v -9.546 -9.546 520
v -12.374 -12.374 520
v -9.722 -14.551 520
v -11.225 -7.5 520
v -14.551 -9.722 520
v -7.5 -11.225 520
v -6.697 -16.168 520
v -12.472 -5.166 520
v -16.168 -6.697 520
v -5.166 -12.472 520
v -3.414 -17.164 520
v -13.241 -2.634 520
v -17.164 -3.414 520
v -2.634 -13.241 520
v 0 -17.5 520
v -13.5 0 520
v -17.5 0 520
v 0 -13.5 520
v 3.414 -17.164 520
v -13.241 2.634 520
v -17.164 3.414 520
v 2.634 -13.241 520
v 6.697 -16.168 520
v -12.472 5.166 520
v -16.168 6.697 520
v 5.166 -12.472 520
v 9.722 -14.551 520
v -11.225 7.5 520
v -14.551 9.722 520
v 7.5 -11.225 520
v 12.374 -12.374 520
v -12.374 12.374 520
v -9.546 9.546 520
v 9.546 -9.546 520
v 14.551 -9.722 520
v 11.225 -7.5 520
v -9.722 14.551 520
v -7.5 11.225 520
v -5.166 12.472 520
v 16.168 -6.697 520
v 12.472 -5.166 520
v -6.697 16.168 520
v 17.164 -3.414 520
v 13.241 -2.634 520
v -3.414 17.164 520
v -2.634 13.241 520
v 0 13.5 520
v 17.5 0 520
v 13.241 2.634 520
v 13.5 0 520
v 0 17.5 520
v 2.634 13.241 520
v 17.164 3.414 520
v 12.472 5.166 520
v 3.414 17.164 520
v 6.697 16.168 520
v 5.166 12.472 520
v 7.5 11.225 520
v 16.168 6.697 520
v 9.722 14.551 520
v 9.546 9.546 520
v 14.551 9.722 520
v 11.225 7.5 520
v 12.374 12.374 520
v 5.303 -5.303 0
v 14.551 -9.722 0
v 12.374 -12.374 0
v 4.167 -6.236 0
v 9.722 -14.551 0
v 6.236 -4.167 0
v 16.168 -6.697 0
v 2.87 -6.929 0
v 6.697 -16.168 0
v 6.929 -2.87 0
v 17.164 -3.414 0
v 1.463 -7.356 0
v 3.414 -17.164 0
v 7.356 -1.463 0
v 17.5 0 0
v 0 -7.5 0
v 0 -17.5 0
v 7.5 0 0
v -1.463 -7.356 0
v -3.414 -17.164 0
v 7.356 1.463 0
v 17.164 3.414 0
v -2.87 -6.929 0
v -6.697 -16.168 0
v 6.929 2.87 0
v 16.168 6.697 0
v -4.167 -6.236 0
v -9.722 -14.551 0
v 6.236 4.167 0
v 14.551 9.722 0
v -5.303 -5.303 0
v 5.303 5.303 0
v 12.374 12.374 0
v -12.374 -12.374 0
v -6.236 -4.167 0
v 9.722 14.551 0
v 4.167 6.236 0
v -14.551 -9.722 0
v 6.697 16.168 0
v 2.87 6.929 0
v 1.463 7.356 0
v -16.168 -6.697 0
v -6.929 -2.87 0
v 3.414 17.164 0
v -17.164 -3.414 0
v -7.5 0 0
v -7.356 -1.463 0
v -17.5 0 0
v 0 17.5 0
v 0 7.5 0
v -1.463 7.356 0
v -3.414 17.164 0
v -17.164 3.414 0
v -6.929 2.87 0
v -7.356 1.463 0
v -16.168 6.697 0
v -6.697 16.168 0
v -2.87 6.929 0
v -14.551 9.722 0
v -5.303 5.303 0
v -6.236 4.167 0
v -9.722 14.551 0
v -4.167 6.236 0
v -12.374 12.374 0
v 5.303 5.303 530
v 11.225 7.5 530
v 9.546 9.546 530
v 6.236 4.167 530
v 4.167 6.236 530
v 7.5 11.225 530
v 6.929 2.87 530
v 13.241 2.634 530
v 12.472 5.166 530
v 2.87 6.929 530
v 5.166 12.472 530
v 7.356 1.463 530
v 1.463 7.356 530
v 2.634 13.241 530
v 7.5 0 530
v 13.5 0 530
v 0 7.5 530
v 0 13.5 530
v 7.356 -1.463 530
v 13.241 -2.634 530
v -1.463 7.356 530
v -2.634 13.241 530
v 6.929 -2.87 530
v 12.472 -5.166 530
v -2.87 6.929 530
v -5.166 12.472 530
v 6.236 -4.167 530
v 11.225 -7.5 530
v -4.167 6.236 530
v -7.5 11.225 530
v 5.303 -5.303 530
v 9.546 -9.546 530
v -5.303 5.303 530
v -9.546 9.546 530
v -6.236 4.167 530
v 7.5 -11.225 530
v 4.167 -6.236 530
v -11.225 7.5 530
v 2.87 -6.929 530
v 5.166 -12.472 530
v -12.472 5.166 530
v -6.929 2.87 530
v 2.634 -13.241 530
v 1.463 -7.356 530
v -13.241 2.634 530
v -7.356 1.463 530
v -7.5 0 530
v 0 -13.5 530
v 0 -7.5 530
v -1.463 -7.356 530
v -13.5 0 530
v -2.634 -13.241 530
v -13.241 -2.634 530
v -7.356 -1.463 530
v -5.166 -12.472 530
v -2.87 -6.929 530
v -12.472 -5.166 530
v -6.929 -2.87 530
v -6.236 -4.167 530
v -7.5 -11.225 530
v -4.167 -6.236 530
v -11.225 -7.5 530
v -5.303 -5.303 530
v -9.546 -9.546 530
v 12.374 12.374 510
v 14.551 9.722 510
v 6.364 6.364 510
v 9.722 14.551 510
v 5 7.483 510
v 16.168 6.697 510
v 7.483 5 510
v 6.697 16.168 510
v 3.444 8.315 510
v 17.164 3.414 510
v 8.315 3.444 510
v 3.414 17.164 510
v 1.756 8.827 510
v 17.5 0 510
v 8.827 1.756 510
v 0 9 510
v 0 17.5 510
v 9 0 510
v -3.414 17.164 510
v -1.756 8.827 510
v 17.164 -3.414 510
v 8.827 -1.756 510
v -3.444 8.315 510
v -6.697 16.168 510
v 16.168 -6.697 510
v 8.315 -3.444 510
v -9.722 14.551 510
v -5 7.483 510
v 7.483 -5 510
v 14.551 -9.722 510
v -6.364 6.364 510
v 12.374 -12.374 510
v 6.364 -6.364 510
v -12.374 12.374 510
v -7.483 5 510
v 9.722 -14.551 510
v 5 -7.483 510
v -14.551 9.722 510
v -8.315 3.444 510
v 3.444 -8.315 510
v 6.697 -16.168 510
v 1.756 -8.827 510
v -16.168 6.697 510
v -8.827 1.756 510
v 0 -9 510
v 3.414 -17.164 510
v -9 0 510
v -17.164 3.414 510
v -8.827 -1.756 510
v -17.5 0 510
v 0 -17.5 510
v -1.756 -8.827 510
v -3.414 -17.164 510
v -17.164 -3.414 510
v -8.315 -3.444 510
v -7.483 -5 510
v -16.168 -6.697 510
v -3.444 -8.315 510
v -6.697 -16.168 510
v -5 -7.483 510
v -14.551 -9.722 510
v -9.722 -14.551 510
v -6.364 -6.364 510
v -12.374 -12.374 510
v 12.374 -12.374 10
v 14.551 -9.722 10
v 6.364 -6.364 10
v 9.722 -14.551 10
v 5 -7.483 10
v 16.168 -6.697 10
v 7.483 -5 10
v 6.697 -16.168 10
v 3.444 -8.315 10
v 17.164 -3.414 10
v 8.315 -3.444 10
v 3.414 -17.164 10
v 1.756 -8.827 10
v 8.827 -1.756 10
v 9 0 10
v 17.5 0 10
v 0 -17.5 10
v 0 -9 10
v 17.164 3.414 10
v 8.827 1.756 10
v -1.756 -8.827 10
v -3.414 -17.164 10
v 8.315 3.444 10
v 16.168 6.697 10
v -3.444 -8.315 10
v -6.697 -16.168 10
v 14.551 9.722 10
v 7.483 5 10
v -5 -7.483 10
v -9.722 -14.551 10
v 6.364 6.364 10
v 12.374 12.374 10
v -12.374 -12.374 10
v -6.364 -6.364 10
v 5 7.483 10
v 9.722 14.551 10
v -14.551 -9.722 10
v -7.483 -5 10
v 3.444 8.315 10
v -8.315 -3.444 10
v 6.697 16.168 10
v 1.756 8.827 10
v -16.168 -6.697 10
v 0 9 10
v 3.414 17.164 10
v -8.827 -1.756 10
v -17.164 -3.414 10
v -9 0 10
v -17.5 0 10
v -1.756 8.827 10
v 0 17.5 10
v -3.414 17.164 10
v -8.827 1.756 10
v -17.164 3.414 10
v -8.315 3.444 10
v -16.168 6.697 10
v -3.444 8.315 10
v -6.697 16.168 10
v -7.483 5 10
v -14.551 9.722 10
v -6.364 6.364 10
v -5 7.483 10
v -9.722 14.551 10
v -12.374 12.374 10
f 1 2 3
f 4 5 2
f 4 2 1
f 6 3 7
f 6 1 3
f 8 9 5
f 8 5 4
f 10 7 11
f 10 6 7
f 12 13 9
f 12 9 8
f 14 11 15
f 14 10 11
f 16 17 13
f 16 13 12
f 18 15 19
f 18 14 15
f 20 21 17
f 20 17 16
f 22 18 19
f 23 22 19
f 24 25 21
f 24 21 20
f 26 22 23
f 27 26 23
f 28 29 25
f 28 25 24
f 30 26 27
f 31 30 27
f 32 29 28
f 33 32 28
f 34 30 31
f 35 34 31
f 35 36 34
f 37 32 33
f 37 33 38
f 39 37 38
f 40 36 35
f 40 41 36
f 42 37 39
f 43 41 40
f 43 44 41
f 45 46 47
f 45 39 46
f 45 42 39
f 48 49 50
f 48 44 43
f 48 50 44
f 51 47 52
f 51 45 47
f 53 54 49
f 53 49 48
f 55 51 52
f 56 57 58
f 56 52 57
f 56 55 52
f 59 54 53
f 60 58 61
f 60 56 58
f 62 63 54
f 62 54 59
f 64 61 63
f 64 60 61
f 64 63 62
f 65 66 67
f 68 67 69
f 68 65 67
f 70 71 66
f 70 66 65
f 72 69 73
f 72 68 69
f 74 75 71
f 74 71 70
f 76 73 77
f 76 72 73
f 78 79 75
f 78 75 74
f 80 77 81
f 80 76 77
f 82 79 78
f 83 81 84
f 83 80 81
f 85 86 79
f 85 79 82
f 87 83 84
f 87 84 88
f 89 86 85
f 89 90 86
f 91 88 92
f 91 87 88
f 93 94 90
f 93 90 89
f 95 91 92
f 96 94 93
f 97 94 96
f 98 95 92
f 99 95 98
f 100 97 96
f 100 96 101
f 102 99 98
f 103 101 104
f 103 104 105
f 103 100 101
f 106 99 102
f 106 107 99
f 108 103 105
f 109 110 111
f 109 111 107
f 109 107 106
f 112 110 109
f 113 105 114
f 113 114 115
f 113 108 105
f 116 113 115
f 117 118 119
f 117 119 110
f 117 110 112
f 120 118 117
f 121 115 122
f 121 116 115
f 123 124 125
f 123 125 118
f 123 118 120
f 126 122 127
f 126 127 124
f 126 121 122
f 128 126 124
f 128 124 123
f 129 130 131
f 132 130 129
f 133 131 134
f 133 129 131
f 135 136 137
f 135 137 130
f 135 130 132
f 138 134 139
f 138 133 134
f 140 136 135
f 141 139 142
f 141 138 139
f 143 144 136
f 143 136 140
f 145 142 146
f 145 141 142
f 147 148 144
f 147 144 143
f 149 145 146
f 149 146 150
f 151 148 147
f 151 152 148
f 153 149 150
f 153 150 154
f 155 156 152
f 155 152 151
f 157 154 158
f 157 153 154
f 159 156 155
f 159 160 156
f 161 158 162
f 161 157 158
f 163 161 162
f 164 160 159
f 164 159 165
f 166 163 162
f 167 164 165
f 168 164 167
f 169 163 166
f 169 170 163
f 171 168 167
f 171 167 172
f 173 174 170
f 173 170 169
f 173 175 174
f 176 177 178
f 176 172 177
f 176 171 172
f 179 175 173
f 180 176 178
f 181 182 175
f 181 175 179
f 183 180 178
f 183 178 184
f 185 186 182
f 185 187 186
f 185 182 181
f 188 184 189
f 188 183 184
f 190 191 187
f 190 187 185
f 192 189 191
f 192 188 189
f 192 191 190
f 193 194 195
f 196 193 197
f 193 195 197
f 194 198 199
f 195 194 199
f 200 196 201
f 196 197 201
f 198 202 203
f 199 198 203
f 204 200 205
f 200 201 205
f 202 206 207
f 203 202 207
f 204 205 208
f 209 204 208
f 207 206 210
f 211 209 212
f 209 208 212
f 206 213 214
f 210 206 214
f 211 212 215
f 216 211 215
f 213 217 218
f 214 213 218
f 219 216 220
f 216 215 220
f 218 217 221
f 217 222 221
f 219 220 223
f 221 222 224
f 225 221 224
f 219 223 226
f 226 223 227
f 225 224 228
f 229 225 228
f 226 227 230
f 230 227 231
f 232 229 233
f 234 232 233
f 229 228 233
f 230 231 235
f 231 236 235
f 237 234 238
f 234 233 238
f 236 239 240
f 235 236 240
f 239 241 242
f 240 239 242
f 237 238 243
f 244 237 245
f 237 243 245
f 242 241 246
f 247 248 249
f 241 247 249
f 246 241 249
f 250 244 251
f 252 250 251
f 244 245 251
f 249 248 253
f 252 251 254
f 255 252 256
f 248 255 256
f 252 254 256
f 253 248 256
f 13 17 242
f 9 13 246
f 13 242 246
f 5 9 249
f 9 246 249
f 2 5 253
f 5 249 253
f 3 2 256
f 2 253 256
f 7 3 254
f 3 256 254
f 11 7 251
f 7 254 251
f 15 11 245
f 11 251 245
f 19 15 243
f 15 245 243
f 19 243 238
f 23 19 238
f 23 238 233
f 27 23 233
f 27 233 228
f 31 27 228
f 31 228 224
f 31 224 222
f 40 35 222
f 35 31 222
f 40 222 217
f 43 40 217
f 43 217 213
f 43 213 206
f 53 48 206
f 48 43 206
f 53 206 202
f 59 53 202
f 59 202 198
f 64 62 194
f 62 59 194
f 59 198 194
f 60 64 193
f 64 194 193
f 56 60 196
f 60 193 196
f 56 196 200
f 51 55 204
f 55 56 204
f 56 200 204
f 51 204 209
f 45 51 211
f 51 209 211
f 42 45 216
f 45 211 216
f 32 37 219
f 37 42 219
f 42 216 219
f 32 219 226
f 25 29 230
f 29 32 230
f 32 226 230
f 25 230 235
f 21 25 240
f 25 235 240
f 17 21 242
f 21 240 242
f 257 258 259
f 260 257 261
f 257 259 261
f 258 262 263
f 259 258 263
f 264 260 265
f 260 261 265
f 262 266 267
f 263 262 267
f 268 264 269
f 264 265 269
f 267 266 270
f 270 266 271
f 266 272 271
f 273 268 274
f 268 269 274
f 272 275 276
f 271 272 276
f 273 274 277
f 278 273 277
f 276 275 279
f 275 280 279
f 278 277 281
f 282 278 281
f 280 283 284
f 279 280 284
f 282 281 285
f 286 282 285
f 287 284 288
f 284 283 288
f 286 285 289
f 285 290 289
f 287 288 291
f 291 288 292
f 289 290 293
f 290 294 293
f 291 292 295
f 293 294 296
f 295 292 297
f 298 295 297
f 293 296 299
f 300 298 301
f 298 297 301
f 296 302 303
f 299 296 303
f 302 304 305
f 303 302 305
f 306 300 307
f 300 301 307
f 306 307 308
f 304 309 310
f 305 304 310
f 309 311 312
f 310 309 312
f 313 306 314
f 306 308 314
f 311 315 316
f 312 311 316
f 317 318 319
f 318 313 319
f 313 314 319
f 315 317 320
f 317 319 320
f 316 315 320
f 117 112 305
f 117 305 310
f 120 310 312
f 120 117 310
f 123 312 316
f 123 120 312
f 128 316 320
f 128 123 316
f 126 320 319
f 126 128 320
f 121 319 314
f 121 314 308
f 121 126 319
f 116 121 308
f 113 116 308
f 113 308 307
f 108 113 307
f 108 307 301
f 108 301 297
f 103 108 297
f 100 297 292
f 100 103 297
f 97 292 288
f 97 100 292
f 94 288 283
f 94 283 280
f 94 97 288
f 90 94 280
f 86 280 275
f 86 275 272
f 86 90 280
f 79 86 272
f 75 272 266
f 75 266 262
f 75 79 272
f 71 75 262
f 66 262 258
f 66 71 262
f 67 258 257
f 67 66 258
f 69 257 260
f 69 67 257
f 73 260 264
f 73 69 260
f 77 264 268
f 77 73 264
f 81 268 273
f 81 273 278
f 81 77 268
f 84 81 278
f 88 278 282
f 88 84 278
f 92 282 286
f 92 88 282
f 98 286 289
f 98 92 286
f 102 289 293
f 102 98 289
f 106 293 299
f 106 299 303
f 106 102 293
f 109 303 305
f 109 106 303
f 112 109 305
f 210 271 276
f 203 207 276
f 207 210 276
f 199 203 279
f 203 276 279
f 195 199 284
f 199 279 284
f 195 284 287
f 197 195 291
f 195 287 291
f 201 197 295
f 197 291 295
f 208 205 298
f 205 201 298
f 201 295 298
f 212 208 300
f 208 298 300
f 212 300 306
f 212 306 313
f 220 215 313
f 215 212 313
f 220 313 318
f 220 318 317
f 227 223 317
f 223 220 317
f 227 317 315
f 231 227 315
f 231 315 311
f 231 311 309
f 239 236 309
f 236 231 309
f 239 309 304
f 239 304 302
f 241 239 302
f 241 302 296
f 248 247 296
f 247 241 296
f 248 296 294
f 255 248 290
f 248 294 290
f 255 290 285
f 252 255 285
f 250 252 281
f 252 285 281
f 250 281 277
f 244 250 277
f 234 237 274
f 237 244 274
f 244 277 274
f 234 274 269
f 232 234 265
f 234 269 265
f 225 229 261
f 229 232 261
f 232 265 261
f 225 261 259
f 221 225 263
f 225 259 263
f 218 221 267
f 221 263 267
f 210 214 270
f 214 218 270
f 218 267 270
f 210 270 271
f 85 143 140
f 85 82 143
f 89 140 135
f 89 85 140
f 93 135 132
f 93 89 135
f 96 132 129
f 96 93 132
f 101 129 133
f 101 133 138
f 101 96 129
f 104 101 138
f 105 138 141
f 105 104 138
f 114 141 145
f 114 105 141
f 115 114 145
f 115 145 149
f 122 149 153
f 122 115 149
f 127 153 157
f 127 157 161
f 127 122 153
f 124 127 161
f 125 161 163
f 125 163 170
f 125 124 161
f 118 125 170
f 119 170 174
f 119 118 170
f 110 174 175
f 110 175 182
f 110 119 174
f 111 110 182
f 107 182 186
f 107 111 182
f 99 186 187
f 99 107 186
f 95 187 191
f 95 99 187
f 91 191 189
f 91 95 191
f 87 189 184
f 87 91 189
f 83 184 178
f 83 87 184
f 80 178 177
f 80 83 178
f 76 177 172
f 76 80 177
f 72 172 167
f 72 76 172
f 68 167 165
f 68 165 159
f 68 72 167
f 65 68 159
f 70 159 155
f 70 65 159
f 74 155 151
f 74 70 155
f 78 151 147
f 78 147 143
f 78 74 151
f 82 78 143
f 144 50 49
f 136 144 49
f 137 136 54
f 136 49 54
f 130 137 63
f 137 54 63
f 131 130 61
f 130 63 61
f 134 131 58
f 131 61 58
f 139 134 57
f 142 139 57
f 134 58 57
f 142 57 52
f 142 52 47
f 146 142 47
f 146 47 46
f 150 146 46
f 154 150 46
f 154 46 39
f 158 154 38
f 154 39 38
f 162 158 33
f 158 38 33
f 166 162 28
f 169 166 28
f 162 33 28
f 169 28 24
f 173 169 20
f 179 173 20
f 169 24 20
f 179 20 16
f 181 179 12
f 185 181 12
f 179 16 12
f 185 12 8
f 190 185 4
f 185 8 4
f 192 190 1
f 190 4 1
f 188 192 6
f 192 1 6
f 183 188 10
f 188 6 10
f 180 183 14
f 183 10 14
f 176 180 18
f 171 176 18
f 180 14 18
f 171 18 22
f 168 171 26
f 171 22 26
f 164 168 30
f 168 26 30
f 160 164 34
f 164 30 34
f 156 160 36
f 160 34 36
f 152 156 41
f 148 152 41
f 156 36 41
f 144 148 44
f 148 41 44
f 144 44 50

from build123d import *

# Parameters (mm, degrees)
SKETCH1_R           = 9
SKETCH1_R_2         = 7.5
BOSS_EXTRUDE1_DEPTH = 530
SKETCH2_R           = 17.5
SKETCH2_R_2         = 7.5
BOSS_EXTRUDE2_DEPTH = 10
BOSS_EXTRUDE3_START = -20
SKETCH3_R           = 17.5
SKETCH3_R_2         = 7.5
BOSS_EXTRUDE3_DEPTH = 20
CUT_EXTRUDE1_START  = -10
SKETCH4_R           = 17.5
SKETCH4_R_2         = 13.5
CUT_EXTRUDE1_DEPTH  = 10


with BuildPart() as part:
    # Sketch1 → Boss-Extrude1 (new body)
    with BuildSketch(Plane.XY):
        Circle(SKETCH1_R)
        Circle(SKETCH1_R_2, mode=Mode.SUBTRACT)
    extrude(amount=BOSS_EXTRUDE1_DEPTH)

    # Sketch2 → Boss-Extrude2 (add)
    with BuildSketch(Plane(origin=(0, 0, 0), x_dir=(-1, 0, 0), z_dir=(0, 0, -1))):
        Circle(SKETCH2_R)
        with Locations(Location((0, 0, 0), (0, 0, 180))):
            Circle(SKETCH2_R_2, mode=Mode.SUBTRACT)
    extrude(amount=-BOSS_EXTRUDE2_DEPTH)

    # Sketch3 → Boss-Extrude3 (add)
    with BuildSketch(Plane.XY.offset(530).offset(BOSS_EXTRUDE3_START)):
        with Locations(Location((0, 0, 0), (0, 0, 180))):
            Circle(SKETCH3_R)
        Circle(SKETCH3_R_2, mode=Mode.SUBTRACT)
    extrude(amount=BOSS_EXTRUDE3_DEPTH)

    # Sketch4 → Cut-Extrude1 (cut)
    with BuildSketch(Plane.XY.offset(530).offset(CUT_EXTRUDE1_START)):
        Circle(SKETCH4_R)
        Circle(SKETCH4_R_2, mode=Mode.SUBTRACT)
    extrude(amount=CUT_EXTRUDE1_DEPTH, mode=Mode.SUBTRACT)


solid = part.part
